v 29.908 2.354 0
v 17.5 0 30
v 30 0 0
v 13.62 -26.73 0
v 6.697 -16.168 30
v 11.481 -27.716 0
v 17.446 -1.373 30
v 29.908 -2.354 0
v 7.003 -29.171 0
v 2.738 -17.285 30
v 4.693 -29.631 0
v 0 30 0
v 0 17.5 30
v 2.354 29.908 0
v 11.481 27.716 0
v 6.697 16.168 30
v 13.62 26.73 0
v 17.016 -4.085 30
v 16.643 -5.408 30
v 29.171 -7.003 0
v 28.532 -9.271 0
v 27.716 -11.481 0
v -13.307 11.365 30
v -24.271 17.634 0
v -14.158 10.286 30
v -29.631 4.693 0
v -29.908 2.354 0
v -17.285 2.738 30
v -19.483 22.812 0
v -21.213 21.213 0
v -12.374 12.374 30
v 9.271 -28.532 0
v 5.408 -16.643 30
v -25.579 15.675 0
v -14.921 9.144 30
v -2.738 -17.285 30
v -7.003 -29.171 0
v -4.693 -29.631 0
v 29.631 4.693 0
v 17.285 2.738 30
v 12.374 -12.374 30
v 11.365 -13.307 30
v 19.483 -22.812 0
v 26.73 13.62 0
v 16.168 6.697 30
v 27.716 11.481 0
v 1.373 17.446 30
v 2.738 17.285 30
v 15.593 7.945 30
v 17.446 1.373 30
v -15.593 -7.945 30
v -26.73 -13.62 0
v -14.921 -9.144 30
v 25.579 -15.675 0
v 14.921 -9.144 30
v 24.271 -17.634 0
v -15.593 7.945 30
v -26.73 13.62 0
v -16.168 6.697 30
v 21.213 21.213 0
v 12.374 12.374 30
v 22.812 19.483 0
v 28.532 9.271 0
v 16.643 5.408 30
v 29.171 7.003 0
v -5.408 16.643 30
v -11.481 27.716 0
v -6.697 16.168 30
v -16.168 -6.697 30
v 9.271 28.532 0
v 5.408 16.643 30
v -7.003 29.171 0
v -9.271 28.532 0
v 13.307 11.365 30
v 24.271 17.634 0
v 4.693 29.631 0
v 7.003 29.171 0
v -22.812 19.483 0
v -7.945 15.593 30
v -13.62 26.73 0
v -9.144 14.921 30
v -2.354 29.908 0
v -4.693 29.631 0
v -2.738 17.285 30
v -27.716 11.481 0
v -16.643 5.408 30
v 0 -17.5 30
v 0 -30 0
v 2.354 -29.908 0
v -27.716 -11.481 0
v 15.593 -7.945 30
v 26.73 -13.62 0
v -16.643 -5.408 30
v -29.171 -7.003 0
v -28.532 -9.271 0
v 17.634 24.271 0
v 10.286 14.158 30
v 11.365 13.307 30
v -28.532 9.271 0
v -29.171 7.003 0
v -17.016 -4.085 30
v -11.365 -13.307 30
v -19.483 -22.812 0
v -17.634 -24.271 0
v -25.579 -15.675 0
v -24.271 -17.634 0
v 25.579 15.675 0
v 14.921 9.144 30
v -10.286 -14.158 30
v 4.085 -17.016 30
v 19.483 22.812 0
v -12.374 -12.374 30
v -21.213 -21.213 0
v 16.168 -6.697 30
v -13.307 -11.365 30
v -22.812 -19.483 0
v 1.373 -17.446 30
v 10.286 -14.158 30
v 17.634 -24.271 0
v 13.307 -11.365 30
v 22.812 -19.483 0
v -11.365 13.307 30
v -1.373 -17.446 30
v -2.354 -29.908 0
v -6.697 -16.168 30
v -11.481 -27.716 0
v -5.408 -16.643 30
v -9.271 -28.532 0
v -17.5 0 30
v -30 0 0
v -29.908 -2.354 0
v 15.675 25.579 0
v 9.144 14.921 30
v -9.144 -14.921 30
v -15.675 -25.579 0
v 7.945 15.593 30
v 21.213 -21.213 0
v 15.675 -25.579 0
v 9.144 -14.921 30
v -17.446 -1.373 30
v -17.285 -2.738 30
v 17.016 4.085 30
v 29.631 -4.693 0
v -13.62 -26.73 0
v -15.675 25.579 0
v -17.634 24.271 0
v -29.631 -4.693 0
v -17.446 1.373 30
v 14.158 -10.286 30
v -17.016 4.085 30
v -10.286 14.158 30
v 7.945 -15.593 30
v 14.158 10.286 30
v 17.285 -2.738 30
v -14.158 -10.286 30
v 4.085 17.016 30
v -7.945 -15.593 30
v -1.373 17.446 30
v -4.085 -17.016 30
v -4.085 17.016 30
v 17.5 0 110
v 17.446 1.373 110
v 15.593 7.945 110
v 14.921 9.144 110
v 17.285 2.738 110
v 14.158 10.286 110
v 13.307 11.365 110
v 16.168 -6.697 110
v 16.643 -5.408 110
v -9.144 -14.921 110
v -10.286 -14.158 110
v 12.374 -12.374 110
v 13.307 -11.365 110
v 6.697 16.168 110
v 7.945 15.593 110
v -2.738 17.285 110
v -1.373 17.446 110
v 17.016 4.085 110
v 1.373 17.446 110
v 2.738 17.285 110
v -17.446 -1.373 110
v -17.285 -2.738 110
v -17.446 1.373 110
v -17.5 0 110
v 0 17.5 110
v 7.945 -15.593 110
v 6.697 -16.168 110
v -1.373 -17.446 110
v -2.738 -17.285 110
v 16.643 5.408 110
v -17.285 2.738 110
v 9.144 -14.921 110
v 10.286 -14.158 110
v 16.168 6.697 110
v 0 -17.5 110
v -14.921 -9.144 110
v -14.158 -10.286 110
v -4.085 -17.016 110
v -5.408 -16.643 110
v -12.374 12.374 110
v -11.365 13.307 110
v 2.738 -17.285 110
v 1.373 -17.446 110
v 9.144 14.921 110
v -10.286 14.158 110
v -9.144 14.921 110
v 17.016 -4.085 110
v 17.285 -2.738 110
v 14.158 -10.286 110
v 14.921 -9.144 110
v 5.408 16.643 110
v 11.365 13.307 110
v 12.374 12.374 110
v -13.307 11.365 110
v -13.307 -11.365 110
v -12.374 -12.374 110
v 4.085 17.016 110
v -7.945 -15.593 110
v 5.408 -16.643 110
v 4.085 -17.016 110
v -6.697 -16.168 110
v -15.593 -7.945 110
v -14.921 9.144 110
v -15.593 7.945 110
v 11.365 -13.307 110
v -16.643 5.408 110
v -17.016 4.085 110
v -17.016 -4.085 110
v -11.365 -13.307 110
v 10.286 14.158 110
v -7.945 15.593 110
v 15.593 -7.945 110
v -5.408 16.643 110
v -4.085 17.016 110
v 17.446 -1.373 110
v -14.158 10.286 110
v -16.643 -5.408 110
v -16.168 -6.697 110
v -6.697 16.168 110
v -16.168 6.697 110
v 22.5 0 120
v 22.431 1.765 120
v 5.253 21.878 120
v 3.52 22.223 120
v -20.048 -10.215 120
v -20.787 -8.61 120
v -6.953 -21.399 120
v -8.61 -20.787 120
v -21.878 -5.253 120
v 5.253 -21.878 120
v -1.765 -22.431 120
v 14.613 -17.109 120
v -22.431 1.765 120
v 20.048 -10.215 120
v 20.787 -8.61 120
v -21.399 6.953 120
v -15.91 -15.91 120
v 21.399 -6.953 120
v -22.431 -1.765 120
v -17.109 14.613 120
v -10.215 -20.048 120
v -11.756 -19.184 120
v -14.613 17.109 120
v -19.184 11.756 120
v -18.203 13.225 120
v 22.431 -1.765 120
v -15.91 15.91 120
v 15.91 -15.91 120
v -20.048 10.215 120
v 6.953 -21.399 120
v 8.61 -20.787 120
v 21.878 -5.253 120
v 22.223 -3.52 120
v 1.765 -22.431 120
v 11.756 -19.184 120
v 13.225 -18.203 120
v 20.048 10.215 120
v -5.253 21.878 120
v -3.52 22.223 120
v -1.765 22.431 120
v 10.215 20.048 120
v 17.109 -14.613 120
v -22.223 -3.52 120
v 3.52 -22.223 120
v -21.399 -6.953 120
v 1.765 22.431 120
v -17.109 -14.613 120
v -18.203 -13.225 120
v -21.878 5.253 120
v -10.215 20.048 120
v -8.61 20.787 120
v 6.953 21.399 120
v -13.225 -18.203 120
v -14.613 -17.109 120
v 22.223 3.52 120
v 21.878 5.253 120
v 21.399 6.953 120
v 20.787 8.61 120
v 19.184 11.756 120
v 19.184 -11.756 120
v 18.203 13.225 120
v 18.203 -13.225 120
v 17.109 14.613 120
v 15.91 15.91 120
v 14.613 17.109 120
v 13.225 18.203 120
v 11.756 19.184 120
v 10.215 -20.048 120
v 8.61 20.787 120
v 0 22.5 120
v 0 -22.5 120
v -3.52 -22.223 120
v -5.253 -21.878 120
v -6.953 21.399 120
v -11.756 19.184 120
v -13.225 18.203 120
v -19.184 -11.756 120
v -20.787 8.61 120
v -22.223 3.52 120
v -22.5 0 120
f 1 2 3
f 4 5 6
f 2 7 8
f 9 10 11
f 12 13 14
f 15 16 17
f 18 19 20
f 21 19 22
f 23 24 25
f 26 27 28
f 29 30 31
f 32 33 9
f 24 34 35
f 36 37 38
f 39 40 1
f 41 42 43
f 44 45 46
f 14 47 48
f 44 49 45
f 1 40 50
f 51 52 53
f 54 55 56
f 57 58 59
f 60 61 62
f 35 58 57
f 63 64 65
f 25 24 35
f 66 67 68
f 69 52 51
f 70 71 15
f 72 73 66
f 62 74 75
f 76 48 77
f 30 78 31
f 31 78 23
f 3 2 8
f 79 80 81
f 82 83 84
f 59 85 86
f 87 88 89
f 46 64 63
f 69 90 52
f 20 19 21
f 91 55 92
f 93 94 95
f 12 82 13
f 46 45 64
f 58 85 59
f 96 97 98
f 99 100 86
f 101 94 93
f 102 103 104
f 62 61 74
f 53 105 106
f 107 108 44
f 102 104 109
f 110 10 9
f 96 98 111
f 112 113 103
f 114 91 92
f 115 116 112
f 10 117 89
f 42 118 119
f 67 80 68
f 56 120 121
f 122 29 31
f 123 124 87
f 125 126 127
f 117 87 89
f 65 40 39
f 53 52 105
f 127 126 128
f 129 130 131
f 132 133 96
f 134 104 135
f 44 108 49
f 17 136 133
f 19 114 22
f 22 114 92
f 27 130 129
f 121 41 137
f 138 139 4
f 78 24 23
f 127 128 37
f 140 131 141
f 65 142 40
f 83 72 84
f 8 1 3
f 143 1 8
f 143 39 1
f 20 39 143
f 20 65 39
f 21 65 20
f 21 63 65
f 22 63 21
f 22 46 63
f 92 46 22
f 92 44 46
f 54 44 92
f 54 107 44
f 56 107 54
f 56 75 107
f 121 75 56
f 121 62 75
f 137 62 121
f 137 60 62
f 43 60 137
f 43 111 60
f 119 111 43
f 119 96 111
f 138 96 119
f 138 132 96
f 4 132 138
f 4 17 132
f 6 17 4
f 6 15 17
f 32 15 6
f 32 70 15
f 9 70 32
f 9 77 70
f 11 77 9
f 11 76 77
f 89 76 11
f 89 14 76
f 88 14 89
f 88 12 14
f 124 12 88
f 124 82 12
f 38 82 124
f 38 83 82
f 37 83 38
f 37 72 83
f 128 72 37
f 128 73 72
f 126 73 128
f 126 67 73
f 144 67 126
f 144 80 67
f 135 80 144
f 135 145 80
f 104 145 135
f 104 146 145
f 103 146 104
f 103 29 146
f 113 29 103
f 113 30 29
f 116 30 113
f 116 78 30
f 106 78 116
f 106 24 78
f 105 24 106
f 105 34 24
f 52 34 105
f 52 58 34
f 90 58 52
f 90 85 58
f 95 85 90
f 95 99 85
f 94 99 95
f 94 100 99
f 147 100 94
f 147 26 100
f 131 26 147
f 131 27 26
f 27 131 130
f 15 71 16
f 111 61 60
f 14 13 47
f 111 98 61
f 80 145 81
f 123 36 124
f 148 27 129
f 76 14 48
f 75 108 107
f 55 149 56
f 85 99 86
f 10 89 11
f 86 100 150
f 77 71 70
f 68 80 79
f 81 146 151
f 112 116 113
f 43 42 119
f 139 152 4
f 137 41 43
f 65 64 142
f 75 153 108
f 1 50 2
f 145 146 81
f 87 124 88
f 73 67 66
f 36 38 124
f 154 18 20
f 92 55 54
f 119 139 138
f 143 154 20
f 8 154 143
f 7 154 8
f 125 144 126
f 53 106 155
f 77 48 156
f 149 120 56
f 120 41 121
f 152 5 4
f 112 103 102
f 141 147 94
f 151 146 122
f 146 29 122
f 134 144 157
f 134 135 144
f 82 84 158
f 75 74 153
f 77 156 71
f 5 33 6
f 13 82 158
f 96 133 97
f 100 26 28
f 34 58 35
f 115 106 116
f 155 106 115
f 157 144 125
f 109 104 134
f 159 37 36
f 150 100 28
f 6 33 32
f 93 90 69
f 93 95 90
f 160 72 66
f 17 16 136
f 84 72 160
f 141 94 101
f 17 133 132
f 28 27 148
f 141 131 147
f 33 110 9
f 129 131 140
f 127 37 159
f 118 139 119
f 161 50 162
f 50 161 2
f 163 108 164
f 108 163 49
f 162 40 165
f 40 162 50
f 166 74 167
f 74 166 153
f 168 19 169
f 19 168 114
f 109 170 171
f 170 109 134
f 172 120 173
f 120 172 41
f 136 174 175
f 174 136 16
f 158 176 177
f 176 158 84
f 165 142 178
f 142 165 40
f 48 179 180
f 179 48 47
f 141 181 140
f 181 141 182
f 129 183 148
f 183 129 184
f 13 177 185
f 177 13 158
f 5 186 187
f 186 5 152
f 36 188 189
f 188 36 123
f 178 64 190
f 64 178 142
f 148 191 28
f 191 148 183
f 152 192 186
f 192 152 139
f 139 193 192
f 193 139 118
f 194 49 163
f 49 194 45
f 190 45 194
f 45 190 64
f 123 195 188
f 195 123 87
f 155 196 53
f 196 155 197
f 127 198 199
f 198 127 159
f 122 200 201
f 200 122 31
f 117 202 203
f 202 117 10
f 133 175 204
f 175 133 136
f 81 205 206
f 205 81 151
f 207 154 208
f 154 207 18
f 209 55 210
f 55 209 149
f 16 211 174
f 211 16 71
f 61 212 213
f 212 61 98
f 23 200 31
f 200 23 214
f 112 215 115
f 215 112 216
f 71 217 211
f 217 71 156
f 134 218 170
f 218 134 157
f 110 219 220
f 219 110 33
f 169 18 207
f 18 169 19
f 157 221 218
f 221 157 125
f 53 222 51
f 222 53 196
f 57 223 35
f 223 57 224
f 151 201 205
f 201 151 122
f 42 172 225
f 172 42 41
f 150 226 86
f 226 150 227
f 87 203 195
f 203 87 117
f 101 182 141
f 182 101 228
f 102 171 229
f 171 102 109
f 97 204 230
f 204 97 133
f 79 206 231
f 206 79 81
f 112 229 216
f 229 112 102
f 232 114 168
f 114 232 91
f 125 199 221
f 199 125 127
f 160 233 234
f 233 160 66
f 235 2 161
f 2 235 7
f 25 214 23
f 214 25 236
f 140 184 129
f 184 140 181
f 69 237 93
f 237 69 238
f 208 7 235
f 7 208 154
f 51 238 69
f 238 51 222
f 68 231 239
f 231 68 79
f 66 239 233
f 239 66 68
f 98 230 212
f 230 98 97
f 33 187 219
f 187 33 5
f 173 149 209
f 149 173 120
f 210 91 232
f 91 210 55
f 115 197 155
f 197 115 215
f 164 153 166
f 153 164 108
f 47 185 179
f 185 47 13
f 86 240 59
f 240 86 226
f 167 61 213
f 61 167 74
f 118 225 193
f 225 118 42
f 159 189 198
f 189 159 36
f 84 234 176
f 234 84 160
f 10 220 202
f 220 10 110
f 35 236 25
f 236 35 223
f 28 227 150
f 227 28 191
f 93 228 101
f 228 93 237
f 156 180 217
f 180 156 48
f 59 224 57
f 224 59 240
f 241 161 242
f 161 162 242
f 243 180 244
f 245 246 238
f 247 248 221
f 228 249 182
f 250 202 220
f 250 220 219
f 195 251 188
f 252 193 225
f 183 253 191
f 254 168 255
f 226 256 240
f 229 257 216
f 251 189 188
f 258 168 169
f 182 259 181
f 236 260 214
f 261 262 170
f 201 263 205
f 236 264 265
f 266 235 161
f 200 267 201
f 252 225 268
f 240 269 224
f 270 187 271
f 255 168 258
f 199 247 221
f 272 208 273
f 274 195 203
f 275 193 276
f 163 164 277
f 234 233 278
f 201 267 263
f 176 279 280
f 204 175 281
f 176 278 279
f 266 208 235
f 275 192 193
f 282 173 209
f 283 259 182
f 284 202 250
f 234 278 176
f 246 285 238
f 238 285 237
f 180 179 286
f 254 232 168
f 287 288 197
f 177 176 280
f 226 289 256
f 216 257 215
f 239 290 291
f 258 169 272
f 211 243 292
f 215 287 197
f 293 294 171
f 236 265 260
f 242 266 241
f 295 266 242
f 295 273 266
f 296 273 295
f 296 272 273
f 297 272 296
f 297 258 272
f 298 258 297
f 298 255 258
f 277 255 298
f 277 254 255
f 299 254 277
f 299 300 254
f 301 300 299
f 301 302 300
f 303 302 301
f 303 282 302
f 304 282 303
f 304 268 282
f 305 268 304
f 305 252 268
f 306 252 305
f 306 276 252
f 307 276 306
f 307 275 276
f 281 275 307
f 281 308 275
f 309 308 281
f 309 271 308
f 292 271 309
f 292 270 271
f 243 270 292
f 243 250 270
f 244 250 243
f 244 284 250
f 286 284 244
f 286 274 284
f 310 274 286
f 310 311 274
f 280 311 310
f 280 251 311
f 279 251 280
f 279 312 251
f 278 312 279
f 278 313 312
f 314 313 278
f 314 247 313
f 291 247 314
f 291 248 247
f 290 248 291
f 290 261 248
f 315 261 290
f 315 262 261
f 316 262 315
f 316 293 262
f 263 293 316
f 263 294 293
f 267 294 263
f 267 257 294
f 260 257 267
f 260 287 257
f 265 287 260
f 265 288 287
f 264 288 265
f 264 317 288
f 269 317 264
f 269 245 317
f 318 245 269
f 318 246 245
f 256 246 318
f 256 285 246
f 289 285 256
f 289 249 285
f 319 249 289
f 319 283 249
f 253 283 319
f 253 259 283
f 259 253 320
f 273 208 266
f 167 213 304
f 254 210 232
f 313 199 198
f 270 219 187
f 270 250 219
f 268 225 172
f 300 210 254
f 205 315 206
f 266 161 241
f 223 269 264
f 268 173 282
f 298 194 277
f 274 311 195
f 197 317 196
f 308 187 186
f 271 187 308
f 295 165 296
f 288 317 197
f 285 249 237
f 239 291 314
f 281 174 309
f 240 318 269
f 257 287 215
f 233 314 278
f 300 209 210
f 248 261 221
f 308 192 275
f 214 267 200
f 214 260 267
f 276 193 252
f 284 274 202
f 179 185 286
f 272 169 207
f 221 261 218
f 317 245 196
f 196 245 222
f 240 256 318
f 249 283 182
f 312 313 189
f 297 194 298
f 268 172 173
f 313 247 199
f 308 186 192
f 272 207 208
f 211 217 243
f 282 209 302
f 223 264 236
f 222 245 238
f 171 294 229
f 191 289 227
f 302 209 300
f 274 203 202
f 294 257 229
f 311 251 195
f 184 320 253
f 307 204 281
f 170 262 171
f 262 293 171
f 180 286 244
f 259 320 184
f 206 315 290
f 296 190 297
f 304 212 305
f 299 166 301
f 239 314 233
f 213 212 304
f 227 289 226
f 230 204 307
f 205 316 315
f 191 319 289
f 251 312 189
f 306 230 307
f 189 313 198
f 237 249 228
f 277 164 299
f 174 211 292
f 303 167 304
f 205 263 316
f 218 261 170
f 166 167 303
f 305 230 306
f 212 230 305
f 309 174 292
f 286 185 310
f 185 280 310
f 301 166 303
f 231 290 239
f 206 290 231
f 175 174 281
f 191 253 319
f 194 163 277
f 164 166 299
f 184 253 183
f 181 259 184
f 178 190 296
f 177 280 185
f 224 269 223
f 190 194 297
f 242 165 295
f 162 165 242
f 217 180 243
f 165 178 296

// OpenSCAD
/* [General] */
render = "arm"; // [first:base,second:arm]
d1 = 35;
d2 = 60;

/* [Arm] */
spool_width = 110;
spool_width = 110;
/*thingiverse
//	text_top = "5lb";
//	font = "ariel:style=Bold"; // style can look like "ariel:style=Bold Italic" to apply styles
//	font_size = 20; // [5:30]
//	font_height = 2; // [.1:5]
*/
/* [Base] */
width = 90; // [30:100]
height = 90; // [30:100]
screw_head = 10; // [4:10]
screw_width = 4; // [2:10]

module added_mount(){
	hull(){
		translate([0,0,-10]) cube([width,height,20+10], center=true);
		cylinder(d=60, h=20);
	}
}
module taken_mount(){
	hull(){
		cylinder(d=60, d2=35, h=30);
		translate([-50,0,0]) cylinder(d=62, d2=36, h=30);
	}
	translate([5,0,-20]) cube([width,height+5,30], center=true);
	//curve edge screws
	translate([-width/2+10,-width/2+10,-width/2]) cylinder(d=screw_width, h=100);
	translate([-width/2+10,-width/2+10,-2]) cylinder(d=screw_head, h=100);
	translate([-width/2+10,width/2-10,-width/2]) cylinder(d=screw_width, h=100);
	translate([-width/2+10,width/2-10,-2]) cylinder(d=screw_head, h=100);

	translate([width/2-10,-width/2+10,-width/2]) cylinder(d=screw_width, h=100);
	translate([width/2-10,-width/2+10,-2]) cylinder(d=screw_head, h=100);
	translate([width/2-10,width/2-10,-width/2]) cylinder(d=screw_width, h=100);
	translate([width/2-10,width/2-10,-2]) cylinder(d=screw_head, h=100);

	translate([width/2,20,-15]) rotate([0,-90,0]) cylinder(d=screw_width, h=100);
	translate([width/2,-20,-15]) rotate([0,-90,0]) cylinder(d=screw_width, h=100);
}

if(render == "base"){
	rotate([0,-90,0]) difference(){
		added_mount();
		taken_mount();
	}
} else if (render == "arm"){
	union(){
		cylinder(d=60, d2=35, h=30, $fn=80);
		cylinder(d=35, h=3+spool_width, $fn=80);
			difference(){
				translate([0,0,spool_width]) cylinder(d=35, d2=45, h=10, $fn=80);
			/*thingiverse
			//	translate([0,0,spool_width+10-font_height]) linear_extrude(height = font_height) {
       		//		text(text = str(text_top), font = font, size = font_size, valign = "center", halign = "center" );
     			//	}
			*/
			}
	}
}
